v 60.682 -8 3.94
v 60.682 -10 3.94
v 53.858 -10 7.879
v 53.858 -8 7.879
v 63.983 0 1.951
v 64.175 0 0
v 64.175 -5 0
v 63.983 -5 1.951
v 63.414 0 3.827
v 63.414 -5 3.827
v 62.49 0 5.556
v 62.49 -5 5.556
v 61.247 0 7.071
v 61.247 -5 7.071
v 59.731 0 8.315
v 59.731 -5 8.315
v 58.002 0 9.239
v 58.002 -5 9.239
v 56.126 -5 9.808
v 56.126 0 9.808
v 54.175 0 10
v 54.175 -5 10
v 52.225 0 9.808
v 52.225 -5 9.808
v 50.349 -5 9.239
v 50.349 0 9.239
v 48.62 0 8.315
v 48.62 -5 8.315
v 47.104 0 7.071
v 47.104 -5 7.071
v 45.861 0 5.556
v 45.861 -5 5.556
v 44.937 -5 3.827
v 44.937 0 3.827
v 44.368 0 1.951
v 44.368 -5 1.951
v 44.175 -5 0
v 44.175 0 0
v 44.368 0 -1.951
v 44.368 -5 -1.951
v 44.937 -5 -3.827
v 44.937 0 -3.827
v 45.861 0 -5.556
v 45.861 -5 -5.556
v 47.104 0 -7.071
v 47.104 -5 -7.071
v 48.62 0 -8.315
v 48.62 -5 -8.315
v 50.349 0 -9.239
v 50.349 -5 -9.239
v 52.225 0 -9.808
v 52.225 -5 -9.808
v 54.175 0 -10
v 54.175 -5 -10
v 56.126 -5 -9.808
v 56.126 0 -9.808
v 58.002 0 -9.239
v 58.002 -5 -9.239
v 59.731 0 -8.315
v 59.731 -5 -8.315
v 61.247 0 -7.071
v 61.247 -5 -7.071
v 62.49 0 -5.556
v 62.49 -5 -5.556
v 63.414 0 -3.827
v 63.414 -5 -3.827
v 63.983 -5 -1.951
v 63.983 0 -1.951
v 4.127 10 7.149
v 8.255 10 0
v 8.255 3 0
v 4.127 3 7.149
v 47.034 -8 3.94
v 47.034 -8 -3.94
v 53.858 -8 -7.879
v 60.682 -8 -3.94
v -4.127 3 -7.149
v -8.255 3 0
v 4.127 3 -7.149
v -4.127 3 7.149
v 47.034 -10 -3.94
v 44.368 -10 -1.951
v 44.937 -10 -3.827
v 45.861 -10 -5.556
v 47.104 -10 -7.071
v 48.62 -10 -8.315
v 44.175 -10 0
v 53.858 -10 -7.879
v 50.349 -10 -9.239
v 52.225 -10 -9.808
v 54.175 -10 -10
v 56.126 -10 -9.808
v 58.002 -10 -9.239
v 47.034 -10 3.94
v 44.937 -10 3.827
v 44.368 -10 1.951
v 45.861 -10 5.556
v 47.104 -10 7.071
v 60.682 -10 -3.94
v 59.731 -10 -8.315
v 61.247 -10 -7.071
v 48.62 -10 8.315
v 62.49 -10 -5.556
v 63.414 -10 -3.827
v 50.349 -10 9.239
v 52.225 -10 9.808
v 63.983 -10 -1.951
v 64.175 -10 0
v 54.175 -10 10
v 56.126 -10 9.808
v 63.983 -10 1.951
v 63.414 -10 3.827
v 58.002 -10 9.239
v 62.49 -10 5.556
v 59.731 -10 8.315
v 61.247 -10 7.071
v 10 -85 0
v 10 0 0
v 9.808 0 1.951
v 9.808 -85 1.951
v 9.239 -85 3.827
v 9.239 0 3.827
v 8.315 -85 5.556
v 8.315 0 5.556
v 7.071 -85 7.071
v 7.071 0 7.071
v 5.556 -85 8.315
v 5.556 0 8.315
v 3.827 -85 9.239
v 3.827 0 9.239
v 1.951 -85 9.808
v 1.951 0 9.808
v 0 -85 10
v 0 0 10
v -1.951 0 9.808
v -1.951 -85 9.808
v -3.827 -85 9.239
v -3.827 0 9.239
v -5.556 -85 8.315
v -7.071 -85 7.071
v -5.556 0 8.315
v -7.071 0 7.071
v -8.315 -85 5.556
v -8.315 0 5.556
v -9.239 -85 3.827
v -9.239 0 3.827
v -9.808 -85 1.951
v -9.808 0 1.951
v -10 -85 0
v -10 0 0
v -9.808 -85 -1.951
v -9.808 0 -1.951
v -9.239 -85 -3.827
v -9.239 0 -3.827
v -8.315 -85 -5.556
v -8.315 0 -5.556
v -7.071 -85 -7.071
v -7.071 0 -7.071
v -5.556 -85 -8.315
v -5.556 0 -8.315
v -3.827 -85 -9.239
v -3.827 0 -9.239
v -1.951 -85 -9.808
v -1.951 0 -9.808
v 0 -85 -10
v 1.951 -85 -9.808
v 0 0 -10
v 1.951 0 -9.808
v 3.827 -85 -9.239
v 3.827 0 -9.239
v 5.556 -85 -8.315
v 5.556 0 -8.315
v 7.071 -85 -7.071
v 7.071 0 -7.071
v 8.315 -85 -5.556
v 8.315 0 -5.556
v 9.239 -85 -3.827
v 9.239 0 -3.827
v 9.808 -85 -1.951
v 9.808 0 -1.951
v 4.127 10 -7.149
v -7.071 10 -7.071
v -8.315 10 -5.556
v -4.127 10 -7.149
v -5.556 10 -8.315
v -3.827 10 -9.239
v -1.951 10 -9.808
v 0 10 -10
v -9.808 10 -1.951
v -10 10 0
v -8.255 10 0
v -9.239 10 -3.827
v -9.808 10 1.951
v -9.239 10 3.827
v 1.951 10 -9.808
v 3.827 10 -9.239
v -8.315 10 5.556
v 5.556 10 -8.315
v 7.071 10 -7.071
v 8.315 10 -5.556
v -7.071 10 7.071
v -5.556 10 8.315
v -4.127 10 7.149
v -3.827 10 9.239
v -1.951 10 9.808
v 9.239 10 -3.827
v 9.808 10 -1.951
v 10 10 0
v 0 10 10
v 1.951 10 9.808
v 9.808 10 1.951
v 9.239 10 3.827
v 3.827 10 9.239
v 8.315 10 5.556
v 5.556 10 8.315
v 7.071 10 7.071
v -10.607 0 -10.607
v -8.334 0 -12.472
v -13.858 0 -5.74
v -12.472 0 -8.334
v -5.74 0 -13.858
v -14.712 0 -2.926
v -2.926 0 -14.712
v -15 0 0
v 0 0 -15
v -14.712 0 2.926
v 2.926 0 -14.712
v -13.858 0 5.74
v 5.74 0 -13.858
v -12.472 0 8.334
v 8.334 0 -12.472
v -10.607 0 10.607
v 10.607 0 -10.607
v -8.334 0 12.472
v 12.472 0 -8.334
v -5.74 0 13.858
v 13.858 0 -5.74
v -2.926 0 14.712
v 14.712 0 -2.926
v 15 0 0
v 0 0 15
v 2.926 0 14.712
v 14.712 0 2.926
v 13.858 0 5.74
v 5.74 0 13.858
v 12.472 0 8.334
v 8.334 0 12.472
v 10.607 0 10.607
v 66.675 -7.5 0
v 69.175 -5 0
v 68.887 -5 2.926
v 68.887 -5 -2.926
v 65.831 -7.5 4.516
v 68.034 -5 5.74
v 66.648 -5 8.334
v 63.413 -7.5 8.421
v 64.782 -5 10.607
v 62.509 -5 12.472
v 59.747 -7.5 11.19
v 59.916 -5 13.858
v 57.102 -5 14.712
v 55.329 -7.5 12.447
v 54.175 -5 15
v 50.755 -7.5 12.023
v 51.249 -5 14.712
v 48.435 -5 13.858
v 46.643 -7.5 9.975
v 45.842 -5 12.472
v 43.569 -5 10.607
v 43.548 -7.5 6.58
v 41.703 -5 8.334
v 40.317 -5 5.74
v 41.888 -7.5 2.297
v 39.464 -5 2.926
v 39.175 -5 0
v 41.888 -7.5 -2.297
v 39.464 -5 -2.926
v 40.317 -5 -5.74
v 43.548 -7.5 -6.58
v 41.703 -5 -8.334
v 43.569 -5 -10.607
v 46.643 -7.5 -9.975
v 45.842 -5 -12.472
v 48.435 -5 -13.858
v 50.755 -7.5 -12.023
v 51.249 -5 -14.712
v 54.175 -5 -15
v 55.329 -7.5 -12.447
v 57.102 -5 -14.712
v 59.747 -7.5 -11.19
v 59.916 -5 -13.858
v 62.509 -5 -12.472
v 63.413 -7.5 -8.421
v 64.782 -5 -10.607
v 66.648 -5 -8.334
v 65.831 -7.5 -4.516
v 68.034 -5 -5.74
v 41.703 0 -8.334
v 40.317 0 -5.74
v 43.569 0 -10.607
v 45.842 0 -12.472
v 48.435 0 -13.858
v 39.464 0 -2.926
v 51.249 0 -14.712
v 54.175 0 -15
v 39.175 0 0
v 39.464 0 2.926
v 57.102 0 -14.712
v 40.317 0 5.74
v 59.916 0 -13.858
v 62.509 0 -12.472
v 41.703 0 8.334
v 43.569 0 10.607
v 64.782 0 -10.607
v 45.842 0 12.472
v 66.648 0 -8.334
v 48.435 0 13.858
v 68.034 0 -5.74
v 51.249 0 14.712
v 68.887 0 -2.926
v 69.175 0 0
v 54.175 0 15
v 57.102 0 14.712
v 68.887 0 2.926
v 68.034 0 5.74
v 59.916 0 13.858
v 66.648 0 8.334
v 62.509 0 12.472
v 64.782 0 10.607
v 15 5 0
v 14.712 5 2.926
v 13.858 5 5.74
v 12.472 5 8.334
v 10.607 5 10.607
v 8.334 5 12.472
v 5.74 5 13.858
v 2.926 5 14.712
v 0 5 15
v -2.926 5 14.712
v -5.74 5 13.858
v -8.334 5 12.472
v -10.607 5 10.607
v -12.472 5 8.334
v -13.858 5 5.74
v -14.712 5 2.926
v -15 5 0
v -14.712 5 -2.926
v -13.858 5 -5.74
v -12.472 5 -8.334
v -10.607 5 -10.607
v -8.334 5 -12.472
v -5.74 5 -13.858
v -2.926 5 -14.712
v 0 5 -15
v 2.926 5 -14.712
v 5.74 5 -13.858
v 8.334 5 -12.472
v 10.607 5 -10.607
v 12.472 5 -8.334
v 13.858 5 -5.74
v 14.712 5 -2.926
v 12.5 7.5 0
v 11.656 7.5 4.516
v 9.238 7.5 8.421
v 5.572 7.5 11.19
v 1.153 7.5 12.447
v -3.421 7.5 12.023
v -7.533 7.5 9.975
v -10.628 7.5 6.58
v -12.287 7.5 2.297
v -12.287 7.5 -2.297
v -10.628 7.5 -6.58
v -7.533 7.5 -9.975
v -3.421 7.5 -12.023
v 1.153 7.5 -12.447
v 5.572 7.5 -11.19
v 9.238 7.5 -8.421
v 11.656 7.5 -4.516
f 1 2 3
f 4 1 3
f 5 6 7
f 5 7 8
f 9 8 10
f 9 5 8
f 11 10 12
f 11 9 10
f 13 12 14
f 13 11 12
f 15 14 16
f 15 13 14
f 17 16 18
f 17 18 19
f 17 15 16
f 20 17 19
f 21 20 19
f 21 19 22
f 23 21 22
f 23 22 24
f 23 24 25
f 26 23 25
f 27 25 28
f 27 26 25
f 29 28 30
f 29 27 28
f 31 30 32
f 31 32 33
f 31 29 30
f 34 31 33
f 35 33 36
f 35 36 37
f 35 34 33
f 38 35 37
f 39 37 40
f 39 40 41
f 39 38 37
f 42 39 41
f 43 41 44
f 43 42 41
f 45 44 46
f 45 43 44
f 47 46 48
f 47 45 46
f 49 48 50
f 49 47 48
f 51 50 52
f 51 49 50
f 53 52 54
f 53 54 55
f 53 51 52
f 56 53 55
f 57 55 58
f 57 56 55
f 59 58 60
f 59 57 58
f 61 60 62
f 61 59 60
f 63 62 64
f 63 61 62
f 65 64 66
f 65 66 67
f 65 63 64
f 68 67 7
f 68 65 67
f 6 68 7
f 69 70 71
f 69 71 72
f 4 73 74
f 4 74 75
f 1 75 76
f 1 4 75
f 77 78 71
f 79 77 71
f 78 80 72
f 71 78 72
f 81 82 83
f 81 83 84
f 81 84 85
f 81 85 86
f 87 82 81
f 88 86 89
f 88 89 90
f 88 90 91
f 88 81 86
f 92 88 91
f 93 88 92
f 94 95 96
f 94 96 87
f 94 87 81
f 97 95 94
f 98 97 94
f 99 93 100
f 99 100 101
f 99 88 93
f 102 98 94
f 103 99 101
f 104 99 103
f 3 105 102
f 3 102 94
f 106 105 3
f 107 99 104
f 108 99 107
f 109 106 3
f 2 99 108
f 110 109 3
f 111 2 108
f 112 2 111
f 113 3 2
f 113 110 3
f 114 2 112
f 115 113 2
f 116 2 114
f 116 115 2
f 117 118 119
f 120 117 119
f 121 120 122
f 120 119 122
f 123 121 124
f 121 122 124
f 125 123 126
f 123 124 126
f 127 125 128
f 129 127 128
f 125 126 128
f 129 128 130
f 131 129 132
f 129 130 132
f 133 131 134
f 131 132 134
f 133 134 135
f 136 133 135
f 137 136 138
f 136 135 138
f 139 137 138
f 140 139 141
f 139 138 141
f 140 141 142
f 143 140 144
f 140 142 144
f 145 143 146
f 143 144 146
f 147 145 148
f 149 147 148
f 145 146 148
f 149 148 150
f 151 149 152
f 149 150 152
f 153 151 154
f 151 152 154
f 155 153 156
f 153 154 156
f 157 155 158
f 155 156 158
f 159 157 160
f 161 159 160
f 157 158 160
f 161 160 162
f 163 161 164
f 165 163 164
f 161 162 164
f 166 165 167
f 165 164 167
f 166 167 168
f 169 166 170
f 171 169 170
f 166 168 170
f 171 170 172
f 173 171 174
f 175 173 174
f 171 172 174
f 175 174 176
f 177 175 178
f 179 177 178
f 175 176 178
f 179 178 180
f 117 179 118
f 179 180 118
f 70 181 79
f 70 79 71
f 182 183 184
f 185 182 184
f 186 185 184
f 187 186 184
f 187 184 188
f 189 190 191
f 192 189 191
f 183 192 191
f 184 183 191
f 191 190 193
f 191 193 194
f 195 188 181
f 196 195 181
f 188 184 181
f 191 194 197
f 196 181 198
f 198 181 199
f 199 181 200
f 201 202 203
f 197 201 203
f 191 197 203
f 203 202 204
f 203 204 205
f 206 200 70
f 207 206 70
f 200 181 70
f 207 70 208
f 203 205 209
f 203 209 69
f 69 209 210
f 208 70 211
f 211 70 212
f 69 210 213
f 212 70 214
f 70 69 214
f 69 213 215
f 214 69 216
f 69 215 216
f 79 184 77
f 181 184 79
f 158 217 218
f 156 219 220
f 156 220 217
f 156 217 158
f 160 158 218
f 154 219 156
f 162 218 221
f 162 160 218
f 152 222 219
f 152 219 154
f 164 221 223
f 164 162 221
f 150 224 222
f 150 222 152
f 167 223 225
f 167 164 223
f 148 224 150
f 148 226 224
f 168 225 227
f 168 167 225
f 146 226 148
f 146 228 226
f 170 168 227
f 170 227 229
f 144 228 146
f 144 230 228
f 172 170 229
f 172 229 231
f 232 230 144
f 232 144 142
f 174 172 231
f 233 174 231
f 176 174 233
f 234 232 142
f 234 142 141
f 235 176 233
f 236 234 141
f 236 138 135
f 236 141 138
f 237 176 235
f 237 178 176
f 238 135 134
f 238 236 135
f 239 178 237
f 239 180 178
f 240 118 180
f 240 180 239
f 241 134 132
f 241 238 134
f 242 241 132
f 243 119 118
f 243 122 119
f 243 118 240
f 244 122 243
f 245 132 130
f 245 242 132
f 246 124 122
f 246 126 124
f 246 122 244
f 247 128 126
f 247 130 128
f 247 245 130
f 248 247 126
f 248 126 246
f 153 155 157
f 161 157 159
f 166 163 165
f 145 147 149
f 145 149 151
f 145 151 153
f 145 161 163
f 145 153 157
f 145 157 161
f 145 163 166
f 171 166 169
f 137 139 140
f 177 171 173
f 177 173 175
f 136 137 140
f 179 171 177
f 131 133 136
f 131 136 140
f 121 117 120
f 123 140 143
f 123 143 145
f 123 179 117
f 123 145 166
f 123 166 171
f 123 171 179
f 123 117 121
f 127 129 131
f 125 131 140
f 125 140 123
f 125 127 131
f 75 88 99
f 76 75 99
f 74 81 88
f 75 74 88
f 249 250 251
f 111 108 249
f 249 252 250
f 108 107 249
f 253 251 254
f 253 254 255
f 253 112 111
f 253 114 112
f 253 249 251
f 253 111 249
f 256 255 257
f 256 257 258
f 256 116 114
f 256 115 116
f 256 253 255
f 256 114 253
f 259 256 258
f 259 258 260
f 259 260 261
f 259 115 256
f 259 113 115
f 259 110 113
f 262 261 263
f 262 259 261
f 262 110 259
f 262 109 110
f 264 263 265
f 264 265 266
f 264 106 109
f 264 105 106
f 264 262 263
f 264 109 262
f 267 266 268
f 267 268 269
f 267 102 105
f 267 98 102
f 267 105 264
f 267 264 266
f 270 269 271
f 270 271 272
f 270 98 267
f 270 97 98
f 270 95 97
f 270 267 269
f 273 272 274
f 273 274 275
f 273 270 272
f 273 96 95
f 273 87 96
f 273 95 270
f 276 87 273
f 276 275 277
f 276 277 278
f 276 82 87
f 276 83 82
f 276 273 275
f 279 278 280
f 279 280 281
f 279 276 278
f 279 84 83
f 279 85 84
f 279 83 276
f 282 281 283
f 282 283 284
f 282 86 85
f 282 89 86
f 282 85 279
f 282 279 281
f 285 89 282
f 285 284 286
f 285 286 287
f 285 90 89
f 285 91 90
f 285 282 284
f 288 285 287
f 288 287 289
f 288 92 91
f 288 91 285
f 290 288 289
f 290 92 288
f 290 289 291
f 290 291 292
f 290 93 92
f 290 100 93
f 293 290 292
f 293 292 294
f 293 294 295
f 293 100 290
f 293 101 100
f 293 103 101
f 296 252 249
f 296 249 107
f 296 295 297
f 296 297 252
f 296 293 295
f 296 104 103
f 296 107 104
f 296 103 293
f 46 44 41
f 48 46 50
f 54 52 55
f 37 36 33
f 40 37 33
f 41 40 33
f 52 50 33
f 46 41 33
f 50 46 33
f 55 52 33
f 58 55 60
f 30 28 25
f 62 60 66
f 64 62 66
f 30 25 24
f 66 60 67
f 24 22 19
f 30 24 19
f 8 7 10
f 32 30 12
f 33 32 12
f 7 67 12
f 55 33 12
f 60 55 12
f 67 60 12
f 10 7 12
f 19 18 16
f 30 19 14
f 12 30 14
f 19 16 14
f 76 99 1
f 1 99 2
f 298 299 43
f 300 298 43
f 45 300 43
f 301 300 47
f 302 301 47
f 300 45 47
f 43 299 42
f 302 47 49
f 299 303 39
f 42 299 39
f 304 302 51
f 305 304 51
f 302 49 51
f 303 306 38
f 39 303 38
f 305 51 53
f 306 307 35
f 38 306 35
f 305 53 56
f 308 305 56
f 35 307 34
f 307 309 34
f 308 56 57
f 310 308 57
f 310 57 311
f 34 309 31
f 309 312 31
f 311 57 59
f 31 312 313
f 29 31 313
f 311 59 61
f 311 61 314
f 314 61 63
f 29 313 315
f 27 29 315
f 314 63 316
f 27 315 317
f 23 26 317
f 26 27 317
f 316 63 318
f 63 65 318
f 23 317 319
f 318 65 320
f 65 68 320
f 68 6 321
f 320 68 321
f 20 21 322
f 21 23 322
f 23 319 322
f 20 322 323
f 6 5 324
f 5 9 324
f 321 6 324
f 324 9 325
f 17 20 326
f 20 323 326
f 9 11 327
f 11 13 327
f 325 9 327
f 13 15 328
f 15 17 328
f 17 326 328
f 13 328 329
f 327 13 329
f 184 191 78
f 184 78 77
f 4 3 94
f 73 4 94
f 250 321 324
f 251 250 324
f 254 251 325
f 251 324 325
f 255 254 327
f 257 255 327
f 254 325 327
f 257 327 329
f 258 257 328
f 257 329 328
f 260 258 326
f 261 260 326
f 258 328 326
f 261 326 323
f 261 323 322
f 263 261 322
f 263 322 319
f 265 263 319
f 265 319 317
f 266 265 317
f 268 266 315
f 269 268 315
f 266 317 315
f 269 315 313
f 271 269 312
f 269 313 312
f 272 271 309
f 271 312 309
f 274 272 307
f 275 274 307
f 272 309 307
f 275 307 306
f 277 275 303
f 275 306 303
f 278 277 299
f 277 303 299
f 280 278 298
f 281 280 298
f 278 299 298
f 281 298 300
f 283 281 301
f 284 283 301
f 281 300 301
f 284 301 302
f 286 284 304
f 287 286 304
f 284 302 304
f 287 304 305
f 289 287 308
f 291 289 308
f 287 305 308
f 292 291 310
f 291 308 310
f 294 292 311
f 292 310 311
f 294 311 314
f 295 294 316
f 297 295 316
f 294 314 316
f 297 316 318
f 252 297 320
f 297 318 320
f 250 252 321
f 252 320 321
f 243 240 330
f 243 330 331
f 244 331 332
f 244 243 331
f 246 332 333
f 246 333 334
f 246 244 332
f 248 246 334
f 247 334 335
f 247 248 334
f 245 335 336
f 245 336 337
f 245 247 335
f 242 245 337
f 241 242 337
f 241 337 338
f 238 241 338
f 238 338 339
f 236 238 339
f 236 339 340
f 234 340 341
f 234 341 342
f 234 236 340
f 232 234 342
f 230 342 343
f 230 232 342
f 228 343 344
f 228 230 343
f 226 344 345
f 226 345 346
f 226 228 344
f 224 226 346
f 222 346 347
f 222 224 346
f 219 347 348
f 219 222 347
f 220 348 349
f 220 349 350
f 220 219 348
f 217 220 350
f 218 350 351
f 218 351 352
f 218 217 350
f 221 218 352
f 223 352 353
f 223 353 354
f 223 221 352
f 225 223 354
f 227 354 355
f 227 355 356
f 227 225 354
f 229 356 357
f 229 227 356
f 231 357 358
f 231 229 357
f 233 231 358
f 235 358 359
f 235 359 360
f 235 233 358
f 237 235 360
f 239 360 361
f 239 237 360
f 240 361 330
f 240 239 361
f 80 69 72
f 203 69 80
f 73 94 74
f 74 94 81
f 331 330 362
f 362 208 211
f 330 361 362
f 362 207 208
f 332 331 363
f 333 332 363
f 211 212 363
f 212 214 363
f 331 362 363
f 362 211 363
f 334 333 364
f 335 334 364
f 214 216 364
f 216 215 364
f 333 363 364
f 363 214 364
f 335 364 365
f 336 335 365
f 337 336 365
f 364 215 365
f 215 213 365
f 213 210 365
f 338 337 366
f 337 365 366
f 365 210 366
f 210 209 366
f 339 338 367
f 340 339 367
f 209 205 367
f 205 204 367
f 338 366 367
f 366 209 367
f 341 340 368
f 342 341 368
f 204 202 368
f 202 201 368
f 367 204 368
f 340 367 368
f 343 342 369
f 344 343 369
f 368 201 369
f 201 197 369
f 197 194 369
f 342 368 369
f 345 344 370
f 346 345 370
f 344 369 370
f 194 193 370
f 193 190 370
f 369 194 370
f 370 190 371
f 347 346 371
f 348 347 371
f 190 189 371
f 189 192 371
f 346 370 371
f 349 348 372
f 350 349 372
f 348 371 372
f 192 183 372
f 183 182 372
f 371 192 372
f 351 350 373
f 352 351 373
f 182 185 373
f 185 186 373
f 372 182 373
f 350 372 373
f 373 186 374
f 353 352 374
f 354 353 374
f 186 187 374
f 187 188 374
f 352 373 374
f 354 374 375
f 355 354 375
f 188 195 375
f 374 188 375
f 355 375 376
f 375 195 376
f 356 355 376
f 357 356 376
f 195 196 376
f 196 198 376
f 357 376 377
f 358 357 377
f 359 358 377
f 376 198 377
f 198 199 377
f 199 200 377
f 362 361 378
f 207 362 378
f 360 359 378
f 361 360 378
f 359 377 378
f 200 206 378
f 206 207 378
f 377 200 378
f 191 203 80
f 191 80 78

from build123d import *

# Parameters (mm, degrees)
F0_R      = 10
F1_DEPTH  = 85
F0_R_2    = 15
F1_FACE_R = 10
F2_DEPTH  = 10
F3_R      = 15
F3_R_2    = 10
F4_DEPTH  = 10
F5_DEPTH  = 5
F6_SIZE   = 5
F6_2_SIZE = 5
F9_DEPTH  = 7
F12_DEPTH = 2


with BuildPart() as f1:
    # F0 (on Front) → F1 (new body)
    with BuildSketch(Plane.XZ):
        Circle(F0_R)
    extrude(amount=F1_DEPTH)

    # F0 (on Front) + F1_face (on face) → F2 (join)
    with BuildSketch(Plane.XZ):
        Circle(F0_R_2)
        Circle(F0_R, mode=Mode.SUBTRACT)
    with BuildSketch(Plane(origin=(0, 0, 0), x_dir=(1, 0, 0), z_dir=(0, 1, 0))):
        Circle(F1_FACE_R)
    extrude(amount=-F2_DEPTH, dir=(0, -1, 0))

    # F6
    f6_edges = [f1.edges().sort_by_distance(p)[0] for p in [
        (-15, 10, 0),
    ]]
    chamfer(f6_edges, length=F6_SIZE)

    # F8 (on offset) → F9 (cut)
    with BuildSketch(Plane.XZ.offset(-10)):
        Polygon((4.1273763635, 7.1488255635), (-4.1273763635, 7.1488255635), (-8.2547527269, 0), (-4.1273763635, -7.1488255635), (4.1273763635, -7.1488255635), (8.2547527269, 0), align=None)
    extrude(amount=F9_DEPTH, mode=Mode.SUBTRACT)


with BuildPart() as f4:
    # F3 (on Front) → F4 (new body)
    with BuildSketch(Plane.XZ):
        with Locations((54.1754961014, 0)):
            Circle(F3_R)
        with Locations((54.1754961014, 0)):
            Circle(F3_R_2, mode=Mode.SUBTRACT)
        with Locations((54.1754961014, 0)):
            Circle(F3_R_2)
    extrude(amount=F4_DEPTH)

    # F3 (on Front) → F5 (cut)
    with BuildSketch(Plane.XZ):
        with Locations((54.1754961014, 0)):
            Circle(F3_R_2)
    extrude(amount=F5_DEPTH, mode=Mode.SUBTRACT)

    # F6#2
    f6_2_edges = [f4.edges().sort_by_distance(p)[0] for p in [
        (39.175496, -10, 0),
    ]]
    chamfer(f6_2_edges, length=F6_2_SIZE)

    # F11 (on offset) → F12 (cut)
    with BuildSketch(Plane.XZ.offset(10)):
        Polygon((60.6820434332, -3.9397101532), (60.6820434332, 3.9397101532), (53.8582652807, 7.8794203064), (47.0344871283, 3.9397101532), (47.0344871283, -3.9397101532), (53.8582652807, -7.8794203064), align=None)
    extrude(amount=-F12_DEPTH, mode=Mode.SUBTRACT)


solid = Compound([f1.part, f4.part])
